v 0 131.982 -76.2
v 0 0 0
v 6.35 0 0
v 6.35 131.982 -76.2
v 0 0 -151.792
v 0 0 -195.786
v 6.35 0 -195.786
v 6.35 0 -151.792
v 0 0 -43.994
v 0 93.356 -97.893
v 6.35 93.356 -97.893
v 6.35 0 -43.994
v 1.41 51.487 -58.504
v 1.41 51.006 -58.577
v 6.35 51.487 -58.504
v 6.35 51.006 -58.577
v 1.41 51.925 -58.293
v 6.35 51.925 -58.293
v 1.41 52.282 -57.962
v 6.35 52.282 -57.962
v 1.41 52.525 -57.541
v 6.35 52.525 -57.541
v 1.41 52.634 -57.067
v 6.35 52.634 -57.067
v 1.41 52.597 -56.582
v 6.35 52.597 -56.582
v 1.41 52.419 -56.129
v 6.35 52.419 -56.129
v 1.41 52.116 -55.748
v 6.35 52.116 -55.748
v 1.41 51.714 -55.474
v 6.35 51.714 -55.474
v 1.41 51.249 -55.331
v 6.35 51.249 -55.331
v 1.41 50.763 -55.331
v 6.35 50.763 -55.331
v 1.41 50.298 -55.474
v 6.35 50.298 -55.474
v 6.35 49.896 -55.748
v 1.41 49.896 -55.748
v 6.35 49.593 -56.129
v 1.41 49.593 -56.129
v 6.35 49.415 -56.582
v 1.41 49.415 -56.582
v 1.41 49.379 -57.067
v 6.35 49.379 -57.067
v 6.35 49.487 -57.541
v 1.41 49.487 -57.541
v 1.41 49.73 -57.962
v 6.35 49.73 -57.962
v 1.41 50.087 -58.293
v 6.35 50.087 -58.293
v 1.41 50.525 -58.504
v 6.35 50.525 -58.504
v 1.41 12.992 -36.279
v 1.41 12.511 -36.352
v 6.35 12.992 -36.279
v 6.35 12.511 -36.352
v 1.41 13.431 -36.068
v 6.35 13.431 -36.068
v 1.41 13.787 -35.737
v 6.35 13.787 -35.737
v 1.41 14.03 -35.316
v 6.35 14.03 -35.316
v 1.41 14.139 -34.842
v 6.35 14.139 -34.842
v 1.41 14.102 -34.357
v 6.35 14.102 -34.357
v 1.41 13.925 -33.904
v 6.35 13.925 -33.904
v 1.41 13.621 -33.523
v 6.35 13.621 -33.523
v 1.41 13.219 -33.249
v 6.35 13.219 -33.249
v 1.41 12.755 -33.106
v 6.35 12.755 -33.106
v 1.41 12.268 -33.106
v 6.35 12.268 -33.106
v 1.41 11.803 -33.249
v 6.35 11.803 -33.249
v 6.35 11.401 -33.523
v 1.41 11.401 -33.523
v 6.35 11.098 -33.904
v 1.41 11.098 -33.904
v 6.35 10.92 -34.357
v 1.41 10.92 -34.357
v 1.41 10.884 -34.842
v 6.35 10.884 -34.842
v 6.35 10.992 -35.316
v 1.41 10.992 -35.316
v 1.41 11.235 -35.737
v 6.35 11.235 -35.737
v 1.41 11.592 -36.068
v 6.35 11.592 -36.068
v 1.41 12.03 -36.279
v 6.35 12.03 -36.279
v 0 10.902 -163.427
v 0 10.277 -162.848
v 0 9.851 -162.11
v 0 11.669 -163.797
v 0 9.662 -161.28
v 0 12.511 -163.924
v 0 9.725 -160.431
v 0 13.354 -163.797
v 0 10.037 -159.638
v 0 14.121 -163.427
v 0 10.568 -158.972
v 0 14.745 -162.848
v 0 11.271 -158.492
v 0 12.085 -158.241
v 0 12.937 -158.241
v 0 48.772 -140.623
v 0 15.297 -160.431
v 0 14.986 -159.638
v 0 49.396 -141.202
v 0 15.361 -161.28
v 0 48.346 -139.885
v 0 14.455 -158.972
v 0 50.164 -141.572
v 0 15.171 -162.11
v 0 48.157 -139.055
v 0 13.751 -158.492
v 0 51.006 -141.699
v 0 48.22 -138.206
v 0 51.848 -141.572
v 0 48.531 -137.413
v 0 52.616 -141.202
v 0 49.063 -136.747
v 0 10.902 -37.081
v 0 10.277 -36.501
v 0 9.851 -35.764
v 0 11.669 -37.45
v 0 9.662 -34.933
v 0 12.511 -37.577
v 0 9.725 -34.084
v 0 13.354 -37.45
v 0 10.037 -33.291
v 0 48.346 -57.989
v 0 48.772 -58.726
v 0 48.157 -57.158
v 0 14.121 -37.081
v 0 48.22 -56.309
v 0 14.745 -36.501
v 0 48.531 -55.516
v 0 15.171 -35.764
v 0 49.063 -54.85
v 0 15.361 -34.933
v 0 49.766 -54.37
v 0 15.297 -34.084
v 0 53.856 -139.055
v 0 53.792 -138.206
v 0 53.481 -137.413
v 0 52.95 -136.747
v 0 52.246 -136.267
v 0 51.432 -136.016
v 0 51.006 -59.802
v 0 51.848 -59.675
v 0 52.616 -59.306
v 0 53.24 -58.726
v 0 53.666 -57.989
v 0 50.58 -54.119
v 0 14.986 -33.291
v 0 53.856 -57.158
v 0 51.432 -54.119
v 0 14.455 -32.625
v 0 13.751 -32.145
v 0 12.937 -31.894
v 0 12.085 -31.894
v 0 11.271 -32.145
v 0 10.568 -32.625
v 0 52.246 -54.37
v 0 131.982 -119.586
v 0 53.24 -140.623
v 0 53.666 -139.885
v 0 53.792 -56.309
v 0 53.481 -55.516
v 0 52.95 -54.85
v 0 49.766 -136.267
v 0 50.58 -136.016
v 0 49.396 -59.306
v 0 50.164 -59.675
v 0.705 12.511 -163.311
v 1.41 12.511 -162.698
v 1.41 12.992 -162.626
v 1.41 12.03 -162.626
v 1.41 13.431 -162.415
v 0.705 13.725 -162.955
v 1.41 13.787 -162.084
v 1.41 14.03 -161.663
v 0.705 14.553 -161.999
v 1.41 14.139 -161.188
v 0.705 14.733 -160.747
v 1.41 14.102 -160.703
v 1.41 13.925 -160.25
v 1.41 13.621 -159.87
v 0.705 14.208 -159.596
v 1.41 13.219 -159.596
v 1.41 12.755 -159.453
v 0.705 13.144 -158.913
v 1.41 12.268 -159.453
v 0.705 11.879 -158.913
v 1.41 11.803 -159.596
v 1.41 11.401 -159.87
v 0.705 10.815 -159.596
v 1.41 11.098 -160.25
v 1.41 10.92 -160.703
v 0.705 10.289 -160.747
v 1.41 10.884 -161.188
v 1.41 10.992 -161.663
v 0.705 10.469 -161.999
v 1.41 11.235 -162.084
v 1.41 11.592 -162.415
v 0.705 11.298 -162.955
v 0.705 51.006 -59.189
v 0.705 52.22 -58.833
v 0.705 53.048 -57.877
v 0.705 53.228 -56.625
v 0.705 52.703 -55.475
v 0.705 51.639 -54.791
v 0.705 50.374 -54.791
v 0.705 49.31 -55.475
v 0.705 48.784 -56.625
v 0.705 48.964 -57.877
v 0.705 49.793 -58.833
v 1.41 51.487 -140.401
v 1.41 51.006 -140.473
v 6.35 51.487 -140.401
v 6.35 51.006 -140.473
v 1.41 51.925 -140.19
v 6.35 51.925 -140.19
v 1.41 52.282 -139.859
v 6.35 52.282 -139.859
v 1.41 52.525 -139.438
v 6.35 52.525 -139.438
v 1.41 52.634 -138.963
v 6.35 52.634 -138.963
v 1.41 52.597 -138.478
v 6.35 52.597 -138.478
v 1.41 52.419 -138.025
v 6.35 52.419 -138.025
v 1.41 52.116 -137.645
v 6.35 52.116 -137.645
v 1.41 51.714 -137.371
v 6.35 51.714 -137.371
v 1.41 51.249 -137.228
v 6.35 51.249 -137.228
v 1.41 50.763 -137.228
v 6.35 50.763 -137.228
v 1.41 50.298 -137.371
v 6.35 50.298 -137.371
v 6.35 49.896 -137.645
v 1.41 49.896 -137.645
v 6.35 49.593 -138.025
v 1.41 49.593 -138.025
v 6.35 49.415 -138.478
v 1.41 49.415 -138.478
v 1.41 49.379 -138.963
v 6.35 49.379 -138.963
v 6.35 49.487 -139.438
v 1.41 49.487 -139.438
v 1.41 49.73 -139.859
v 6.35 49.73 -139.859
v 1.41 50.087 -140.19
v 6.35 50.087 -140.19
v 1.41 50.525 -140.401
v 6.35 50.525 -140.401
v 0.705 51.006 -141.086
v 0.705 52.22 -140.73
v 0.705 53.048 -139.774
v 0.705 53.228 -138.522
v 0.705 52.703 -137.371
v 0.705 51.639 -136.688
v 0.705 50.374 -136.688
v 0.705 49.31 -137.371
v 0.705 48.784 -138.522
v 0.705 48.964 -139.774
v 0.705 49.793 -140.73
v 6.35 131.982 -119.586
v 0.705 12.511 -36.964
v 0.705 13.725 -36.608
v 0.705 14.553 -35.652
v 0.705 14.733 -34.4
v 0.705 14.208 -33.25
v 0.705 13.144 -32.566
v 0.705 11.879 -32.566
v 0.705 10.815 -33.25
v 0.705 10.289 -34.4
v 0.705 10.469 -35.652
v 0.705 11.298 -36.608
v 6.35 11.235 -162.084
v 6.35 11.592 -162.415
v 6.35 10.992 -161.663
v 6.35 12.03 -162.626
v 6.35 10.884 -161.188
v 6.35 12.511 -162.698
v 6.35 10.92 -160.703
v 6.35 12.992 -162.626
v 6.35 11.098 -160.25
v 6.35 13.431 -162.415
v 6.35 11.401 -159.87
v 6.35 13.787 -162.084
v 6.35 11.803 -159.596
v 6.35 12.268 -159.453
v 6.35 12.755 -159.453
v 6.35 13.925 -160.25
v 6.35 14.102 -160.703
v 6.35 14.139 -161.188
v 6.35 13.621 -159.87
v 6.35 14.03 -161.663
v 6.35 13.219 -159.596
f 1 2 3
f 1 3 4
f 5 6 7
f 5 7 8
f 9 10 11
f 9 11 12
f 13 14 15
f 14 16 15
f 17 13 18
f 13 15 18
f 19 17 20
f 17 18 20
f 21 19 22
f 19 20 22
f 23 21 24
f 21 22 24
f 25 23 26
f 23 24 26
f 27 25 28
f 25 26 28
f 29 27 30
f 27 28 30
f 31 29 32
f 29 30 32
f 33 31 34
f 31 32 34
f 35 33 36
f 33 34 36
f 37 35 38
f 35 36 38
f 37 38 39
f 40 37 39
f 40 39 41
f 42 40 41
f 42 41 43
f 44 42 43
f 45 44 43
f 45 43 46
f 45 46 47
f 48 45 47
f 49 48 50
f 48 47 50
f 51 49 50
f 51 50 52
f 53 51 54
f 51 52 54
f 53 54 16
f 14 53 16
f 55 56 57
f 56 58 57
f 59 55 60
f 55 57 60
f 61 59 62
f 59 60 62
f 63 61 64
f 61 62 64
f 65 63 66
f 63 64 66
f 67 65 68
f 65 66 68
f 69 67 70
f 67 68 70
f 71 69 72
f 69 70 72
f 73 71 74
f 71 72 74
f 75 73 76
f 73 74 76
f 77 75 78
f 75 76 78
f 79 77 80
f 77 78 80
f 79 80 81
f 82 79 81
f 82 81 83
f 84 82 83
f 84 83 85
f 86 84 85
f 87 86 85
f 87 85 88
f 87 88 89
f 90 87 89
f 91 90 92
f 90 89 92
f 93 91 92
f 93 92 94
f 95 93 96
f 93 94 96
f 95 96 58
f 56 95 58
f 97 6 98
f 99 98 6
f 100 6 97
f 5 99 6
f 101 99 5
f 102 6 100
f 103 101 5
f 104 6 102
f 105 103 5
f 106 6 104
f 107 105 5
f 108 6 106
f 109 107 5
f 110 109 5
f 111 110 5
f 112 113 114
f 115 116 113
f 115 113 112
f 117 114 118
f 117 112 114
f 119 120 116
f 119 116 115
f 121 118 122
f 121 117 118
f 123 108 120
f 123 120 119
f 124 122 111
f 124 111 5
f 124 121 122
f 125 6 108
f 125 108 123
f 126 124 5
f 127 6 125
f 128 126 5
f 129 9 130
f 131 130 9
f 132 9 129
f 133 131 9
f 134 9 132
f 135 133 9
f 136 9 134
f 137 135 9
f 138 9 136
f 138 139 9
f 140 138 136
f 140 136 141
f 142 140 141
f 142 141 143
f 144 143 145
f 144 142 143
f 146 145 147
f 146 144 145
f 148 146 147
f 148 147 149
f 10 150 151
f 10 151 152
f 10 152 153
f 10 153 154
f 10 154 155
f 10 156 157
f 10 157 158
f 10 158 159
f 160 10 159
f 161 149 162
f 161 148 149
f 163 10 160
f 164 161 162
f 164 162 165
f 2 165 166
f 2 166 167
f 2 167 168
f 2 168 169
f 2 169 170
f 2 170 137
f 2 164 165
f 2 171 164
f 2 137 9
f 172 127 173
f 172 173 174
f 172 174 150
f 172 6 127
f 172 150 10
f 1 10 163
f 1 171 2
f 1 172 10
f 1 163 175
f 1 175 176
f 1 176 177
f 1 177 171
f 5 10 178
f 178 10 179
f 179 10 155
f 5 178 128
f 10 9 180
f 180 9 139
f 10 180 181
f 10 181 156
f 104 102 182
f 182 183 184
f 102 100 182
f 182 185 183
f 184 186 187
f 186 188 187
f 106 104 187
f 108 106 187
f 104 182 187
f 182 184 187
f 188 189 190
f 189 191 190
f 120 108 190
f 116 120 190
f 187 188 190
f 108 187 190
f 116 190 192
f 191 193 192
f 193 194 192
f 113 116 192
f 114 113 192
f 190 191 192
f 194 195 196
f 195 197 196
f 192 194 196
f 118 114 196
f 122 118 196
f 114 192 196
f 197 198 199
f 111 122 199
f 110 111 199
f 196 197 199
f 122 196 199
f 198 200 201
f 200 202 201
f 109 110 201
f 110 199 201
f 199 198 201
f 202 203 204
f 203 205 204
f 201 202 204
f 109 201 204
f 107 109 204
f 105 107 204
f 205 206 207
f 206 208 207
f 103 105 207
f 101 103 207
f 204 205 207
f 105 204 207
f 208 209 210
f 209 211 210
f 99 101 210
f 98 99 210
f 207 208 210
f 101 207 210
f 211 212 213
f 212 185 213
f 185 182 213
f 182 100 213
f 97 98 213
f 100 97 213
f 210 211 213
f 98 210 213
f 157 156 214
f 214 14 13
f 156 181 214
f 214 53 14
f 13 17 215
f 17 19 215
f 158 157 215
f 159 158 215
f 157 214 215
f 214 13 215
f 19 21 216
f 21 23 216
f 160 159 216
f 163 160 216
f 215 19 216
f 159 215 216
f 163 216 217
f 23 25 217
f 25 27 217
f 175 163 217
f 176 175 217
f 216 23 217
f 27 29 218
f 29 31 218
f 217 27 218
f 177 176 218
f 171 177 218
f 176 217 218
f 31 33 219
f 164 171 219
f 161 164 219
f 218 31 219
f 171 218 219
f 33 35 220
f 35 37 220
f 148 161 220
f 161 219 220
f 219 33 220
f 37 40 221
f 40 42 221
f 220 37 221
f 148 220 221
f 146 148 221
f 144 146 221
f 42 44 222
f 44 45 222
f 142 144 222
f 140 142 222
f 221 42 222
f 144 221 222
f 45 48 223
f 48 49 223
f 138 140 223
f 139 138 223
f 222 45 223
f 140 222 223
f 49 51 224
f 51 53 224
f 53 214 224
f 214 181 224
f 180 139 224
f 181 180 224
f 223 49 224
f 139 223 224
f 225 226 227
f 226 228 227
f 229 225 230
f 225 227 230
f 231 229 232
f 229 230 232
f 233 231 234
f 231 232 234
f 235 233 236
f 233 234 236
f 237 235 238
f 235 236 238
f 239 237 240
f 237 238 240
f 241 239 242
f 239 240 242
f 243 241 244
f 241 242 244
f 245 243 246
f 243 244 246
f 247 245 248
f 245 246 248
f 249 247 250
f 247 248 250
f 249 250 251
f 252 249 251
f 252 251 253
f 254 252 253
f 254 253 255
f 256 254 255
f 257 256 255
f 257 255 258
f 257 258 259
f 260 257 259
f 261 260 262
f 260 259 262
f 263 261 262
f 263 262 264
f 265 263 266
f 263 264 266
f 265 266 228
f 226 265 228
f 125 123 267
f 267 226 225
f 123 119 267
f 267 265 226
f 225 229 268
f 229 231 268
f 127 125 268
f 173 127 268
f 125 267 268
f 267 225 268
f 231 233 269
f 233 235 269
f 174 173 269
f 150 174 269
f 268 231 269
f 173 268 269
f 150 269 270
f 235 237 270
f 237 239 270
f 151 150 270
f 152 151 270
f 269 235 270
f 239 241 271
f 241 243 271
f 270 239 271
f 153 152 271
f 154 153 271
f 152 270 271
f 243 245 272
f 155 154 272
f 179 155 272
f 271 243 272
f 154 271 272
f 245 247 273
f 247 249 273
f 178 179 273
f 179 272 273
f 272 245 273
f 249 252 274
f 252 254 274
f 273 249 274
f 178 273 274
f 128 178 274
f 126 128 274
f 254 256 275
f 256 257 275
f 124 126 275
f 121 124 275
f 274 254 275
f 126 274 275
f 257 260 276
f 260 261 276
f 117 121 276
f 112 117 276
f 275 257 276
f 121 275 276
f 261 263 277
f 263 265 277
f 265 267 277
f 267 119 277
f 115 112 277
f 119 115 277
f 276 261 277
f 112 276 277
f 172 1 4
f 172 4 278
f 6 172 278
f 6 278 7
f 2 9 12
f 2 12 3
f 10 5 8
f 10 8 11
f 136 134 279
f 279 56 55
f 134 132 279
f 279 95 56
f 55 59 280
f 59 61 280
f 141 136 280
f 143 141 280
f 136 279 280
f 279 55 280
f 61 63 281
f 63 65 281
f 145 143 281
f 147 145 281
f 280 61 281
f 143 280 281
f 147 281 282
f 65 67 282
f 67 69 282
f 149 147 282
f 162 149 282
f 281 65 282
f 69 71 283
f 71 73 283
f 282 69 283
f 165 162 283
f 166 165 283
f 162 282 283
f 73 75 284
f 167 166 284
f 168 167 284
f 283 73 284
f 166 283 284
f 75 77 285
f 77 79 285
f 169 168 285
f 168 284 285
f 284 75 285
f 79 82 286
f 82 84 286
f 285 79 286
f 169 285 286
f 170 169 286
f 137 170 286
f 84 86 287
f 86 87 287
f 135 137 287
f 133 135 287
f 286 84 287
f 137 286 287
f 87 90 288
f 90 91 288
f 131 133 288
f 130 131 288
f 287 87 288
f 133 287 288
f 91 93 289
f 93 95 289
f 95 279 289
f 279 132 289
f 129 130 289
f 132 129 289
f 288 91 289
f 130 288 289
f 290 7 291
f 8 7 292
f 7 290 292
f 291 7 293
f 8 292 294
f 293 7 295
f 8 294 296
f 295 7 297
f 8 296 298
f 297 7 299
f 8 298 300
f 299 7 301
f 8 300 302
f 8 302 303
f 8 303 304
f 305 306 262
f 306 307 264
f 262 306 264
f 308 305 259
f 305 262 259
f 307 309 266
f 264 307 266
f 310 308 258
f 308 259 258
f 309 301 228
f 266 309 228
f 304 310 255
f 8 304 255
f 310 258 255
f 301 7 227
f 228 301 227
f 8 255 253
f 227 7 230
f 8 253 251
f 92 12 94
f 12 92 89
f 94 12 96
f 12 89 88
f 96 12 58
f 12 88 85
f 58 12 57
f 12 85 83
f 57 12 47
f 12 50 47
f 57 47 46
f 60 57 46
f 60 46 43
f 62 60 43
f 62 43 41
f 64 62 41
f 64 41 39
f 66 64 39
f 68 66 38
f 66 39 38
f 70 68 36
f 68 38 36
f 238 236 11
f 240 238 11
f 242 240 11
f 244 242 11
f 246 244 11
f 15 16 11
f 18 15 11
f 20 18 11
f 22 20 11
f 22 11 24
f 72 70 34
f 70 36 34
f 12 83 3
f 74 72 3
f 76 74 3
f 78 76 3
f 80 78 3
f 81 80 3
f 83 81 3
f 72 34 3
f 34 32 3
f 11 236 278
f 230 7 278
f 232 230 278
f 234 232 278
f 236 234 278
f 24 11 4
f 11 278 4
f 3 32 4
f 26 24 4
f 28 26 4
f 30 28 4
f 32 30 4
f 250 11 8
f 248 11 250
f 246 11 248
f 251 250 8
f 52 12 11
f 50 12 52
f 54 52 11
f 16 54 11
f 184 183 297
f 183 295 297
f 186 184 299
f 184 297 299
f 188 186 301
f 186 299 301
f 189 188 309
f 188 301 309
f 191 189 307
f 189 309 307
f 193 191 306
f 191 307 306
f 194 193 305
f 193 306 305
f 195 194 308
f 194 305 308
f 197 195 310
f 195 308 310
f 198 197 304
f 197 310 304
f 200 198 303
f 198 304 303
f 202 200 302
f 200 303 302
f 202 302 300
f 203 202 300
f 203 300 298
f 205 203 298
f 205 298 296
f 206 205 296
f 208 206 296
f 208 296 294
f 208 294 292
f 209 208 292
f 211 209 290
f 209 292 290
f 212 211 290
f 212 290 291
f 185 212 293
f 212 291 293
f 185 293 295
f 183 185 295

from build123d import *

# Parameters (mm, degrees)
BOSS_EXTRUDE1_DEPTH                            = 6.35
CSK_FOR_4_FLAT_HEAD_MACHINE_SCREW1_D           = 3.2639
CSK_FOR_4_FLAT_HEAD_MACHINE_SCREW1_CSINK_D     = 5.715
CSK_FOR_4_FLAT_HEAD_MACHINE_SCREW1_CSINK_ANGLE = 82


with BuildPart() as part:
    # Sketch1 → Boss-Extrude1 (new body)
    with BuildSketch(Plane(origin=(0, 0, 0), x_dir=(0, 0, -1), z_dir=(1, 0, 0))):
        Polygon((0, 0), (76.2, 131.982271537), (119.58608314, 131.982271537), (195.78608314, 0), (151.791992628, 0), (97.89304157, 93.355721707), (43.994090512, 0), align=None)
    extrude(amount=BOSS_EXTRUDE1_DEPTH)

    # CSK for #4 Flat Head Machine Screw1 (through all)
    with Locations(Plane.ZY):
        with Locations((-161.066379527, 12.511290682), (-138.841379527, 51.00611988), (-56.944703613, 51.00611988), (-34.719703613, 12.511290682)):
            CounterSinkHole(CSK_FOR_4_FLAT_HEAD_MACHINE_SCREW1_D / 2, CSK_FOR_4_FLAT_HEAD_MACHINE_SCREW1_CSINK_D / 2, counter_sink_angle=CSK_FOR_4_FLAT_HEAD_MACHINE_SCREW1_CSINK_ANGLE)


solid = part.part
